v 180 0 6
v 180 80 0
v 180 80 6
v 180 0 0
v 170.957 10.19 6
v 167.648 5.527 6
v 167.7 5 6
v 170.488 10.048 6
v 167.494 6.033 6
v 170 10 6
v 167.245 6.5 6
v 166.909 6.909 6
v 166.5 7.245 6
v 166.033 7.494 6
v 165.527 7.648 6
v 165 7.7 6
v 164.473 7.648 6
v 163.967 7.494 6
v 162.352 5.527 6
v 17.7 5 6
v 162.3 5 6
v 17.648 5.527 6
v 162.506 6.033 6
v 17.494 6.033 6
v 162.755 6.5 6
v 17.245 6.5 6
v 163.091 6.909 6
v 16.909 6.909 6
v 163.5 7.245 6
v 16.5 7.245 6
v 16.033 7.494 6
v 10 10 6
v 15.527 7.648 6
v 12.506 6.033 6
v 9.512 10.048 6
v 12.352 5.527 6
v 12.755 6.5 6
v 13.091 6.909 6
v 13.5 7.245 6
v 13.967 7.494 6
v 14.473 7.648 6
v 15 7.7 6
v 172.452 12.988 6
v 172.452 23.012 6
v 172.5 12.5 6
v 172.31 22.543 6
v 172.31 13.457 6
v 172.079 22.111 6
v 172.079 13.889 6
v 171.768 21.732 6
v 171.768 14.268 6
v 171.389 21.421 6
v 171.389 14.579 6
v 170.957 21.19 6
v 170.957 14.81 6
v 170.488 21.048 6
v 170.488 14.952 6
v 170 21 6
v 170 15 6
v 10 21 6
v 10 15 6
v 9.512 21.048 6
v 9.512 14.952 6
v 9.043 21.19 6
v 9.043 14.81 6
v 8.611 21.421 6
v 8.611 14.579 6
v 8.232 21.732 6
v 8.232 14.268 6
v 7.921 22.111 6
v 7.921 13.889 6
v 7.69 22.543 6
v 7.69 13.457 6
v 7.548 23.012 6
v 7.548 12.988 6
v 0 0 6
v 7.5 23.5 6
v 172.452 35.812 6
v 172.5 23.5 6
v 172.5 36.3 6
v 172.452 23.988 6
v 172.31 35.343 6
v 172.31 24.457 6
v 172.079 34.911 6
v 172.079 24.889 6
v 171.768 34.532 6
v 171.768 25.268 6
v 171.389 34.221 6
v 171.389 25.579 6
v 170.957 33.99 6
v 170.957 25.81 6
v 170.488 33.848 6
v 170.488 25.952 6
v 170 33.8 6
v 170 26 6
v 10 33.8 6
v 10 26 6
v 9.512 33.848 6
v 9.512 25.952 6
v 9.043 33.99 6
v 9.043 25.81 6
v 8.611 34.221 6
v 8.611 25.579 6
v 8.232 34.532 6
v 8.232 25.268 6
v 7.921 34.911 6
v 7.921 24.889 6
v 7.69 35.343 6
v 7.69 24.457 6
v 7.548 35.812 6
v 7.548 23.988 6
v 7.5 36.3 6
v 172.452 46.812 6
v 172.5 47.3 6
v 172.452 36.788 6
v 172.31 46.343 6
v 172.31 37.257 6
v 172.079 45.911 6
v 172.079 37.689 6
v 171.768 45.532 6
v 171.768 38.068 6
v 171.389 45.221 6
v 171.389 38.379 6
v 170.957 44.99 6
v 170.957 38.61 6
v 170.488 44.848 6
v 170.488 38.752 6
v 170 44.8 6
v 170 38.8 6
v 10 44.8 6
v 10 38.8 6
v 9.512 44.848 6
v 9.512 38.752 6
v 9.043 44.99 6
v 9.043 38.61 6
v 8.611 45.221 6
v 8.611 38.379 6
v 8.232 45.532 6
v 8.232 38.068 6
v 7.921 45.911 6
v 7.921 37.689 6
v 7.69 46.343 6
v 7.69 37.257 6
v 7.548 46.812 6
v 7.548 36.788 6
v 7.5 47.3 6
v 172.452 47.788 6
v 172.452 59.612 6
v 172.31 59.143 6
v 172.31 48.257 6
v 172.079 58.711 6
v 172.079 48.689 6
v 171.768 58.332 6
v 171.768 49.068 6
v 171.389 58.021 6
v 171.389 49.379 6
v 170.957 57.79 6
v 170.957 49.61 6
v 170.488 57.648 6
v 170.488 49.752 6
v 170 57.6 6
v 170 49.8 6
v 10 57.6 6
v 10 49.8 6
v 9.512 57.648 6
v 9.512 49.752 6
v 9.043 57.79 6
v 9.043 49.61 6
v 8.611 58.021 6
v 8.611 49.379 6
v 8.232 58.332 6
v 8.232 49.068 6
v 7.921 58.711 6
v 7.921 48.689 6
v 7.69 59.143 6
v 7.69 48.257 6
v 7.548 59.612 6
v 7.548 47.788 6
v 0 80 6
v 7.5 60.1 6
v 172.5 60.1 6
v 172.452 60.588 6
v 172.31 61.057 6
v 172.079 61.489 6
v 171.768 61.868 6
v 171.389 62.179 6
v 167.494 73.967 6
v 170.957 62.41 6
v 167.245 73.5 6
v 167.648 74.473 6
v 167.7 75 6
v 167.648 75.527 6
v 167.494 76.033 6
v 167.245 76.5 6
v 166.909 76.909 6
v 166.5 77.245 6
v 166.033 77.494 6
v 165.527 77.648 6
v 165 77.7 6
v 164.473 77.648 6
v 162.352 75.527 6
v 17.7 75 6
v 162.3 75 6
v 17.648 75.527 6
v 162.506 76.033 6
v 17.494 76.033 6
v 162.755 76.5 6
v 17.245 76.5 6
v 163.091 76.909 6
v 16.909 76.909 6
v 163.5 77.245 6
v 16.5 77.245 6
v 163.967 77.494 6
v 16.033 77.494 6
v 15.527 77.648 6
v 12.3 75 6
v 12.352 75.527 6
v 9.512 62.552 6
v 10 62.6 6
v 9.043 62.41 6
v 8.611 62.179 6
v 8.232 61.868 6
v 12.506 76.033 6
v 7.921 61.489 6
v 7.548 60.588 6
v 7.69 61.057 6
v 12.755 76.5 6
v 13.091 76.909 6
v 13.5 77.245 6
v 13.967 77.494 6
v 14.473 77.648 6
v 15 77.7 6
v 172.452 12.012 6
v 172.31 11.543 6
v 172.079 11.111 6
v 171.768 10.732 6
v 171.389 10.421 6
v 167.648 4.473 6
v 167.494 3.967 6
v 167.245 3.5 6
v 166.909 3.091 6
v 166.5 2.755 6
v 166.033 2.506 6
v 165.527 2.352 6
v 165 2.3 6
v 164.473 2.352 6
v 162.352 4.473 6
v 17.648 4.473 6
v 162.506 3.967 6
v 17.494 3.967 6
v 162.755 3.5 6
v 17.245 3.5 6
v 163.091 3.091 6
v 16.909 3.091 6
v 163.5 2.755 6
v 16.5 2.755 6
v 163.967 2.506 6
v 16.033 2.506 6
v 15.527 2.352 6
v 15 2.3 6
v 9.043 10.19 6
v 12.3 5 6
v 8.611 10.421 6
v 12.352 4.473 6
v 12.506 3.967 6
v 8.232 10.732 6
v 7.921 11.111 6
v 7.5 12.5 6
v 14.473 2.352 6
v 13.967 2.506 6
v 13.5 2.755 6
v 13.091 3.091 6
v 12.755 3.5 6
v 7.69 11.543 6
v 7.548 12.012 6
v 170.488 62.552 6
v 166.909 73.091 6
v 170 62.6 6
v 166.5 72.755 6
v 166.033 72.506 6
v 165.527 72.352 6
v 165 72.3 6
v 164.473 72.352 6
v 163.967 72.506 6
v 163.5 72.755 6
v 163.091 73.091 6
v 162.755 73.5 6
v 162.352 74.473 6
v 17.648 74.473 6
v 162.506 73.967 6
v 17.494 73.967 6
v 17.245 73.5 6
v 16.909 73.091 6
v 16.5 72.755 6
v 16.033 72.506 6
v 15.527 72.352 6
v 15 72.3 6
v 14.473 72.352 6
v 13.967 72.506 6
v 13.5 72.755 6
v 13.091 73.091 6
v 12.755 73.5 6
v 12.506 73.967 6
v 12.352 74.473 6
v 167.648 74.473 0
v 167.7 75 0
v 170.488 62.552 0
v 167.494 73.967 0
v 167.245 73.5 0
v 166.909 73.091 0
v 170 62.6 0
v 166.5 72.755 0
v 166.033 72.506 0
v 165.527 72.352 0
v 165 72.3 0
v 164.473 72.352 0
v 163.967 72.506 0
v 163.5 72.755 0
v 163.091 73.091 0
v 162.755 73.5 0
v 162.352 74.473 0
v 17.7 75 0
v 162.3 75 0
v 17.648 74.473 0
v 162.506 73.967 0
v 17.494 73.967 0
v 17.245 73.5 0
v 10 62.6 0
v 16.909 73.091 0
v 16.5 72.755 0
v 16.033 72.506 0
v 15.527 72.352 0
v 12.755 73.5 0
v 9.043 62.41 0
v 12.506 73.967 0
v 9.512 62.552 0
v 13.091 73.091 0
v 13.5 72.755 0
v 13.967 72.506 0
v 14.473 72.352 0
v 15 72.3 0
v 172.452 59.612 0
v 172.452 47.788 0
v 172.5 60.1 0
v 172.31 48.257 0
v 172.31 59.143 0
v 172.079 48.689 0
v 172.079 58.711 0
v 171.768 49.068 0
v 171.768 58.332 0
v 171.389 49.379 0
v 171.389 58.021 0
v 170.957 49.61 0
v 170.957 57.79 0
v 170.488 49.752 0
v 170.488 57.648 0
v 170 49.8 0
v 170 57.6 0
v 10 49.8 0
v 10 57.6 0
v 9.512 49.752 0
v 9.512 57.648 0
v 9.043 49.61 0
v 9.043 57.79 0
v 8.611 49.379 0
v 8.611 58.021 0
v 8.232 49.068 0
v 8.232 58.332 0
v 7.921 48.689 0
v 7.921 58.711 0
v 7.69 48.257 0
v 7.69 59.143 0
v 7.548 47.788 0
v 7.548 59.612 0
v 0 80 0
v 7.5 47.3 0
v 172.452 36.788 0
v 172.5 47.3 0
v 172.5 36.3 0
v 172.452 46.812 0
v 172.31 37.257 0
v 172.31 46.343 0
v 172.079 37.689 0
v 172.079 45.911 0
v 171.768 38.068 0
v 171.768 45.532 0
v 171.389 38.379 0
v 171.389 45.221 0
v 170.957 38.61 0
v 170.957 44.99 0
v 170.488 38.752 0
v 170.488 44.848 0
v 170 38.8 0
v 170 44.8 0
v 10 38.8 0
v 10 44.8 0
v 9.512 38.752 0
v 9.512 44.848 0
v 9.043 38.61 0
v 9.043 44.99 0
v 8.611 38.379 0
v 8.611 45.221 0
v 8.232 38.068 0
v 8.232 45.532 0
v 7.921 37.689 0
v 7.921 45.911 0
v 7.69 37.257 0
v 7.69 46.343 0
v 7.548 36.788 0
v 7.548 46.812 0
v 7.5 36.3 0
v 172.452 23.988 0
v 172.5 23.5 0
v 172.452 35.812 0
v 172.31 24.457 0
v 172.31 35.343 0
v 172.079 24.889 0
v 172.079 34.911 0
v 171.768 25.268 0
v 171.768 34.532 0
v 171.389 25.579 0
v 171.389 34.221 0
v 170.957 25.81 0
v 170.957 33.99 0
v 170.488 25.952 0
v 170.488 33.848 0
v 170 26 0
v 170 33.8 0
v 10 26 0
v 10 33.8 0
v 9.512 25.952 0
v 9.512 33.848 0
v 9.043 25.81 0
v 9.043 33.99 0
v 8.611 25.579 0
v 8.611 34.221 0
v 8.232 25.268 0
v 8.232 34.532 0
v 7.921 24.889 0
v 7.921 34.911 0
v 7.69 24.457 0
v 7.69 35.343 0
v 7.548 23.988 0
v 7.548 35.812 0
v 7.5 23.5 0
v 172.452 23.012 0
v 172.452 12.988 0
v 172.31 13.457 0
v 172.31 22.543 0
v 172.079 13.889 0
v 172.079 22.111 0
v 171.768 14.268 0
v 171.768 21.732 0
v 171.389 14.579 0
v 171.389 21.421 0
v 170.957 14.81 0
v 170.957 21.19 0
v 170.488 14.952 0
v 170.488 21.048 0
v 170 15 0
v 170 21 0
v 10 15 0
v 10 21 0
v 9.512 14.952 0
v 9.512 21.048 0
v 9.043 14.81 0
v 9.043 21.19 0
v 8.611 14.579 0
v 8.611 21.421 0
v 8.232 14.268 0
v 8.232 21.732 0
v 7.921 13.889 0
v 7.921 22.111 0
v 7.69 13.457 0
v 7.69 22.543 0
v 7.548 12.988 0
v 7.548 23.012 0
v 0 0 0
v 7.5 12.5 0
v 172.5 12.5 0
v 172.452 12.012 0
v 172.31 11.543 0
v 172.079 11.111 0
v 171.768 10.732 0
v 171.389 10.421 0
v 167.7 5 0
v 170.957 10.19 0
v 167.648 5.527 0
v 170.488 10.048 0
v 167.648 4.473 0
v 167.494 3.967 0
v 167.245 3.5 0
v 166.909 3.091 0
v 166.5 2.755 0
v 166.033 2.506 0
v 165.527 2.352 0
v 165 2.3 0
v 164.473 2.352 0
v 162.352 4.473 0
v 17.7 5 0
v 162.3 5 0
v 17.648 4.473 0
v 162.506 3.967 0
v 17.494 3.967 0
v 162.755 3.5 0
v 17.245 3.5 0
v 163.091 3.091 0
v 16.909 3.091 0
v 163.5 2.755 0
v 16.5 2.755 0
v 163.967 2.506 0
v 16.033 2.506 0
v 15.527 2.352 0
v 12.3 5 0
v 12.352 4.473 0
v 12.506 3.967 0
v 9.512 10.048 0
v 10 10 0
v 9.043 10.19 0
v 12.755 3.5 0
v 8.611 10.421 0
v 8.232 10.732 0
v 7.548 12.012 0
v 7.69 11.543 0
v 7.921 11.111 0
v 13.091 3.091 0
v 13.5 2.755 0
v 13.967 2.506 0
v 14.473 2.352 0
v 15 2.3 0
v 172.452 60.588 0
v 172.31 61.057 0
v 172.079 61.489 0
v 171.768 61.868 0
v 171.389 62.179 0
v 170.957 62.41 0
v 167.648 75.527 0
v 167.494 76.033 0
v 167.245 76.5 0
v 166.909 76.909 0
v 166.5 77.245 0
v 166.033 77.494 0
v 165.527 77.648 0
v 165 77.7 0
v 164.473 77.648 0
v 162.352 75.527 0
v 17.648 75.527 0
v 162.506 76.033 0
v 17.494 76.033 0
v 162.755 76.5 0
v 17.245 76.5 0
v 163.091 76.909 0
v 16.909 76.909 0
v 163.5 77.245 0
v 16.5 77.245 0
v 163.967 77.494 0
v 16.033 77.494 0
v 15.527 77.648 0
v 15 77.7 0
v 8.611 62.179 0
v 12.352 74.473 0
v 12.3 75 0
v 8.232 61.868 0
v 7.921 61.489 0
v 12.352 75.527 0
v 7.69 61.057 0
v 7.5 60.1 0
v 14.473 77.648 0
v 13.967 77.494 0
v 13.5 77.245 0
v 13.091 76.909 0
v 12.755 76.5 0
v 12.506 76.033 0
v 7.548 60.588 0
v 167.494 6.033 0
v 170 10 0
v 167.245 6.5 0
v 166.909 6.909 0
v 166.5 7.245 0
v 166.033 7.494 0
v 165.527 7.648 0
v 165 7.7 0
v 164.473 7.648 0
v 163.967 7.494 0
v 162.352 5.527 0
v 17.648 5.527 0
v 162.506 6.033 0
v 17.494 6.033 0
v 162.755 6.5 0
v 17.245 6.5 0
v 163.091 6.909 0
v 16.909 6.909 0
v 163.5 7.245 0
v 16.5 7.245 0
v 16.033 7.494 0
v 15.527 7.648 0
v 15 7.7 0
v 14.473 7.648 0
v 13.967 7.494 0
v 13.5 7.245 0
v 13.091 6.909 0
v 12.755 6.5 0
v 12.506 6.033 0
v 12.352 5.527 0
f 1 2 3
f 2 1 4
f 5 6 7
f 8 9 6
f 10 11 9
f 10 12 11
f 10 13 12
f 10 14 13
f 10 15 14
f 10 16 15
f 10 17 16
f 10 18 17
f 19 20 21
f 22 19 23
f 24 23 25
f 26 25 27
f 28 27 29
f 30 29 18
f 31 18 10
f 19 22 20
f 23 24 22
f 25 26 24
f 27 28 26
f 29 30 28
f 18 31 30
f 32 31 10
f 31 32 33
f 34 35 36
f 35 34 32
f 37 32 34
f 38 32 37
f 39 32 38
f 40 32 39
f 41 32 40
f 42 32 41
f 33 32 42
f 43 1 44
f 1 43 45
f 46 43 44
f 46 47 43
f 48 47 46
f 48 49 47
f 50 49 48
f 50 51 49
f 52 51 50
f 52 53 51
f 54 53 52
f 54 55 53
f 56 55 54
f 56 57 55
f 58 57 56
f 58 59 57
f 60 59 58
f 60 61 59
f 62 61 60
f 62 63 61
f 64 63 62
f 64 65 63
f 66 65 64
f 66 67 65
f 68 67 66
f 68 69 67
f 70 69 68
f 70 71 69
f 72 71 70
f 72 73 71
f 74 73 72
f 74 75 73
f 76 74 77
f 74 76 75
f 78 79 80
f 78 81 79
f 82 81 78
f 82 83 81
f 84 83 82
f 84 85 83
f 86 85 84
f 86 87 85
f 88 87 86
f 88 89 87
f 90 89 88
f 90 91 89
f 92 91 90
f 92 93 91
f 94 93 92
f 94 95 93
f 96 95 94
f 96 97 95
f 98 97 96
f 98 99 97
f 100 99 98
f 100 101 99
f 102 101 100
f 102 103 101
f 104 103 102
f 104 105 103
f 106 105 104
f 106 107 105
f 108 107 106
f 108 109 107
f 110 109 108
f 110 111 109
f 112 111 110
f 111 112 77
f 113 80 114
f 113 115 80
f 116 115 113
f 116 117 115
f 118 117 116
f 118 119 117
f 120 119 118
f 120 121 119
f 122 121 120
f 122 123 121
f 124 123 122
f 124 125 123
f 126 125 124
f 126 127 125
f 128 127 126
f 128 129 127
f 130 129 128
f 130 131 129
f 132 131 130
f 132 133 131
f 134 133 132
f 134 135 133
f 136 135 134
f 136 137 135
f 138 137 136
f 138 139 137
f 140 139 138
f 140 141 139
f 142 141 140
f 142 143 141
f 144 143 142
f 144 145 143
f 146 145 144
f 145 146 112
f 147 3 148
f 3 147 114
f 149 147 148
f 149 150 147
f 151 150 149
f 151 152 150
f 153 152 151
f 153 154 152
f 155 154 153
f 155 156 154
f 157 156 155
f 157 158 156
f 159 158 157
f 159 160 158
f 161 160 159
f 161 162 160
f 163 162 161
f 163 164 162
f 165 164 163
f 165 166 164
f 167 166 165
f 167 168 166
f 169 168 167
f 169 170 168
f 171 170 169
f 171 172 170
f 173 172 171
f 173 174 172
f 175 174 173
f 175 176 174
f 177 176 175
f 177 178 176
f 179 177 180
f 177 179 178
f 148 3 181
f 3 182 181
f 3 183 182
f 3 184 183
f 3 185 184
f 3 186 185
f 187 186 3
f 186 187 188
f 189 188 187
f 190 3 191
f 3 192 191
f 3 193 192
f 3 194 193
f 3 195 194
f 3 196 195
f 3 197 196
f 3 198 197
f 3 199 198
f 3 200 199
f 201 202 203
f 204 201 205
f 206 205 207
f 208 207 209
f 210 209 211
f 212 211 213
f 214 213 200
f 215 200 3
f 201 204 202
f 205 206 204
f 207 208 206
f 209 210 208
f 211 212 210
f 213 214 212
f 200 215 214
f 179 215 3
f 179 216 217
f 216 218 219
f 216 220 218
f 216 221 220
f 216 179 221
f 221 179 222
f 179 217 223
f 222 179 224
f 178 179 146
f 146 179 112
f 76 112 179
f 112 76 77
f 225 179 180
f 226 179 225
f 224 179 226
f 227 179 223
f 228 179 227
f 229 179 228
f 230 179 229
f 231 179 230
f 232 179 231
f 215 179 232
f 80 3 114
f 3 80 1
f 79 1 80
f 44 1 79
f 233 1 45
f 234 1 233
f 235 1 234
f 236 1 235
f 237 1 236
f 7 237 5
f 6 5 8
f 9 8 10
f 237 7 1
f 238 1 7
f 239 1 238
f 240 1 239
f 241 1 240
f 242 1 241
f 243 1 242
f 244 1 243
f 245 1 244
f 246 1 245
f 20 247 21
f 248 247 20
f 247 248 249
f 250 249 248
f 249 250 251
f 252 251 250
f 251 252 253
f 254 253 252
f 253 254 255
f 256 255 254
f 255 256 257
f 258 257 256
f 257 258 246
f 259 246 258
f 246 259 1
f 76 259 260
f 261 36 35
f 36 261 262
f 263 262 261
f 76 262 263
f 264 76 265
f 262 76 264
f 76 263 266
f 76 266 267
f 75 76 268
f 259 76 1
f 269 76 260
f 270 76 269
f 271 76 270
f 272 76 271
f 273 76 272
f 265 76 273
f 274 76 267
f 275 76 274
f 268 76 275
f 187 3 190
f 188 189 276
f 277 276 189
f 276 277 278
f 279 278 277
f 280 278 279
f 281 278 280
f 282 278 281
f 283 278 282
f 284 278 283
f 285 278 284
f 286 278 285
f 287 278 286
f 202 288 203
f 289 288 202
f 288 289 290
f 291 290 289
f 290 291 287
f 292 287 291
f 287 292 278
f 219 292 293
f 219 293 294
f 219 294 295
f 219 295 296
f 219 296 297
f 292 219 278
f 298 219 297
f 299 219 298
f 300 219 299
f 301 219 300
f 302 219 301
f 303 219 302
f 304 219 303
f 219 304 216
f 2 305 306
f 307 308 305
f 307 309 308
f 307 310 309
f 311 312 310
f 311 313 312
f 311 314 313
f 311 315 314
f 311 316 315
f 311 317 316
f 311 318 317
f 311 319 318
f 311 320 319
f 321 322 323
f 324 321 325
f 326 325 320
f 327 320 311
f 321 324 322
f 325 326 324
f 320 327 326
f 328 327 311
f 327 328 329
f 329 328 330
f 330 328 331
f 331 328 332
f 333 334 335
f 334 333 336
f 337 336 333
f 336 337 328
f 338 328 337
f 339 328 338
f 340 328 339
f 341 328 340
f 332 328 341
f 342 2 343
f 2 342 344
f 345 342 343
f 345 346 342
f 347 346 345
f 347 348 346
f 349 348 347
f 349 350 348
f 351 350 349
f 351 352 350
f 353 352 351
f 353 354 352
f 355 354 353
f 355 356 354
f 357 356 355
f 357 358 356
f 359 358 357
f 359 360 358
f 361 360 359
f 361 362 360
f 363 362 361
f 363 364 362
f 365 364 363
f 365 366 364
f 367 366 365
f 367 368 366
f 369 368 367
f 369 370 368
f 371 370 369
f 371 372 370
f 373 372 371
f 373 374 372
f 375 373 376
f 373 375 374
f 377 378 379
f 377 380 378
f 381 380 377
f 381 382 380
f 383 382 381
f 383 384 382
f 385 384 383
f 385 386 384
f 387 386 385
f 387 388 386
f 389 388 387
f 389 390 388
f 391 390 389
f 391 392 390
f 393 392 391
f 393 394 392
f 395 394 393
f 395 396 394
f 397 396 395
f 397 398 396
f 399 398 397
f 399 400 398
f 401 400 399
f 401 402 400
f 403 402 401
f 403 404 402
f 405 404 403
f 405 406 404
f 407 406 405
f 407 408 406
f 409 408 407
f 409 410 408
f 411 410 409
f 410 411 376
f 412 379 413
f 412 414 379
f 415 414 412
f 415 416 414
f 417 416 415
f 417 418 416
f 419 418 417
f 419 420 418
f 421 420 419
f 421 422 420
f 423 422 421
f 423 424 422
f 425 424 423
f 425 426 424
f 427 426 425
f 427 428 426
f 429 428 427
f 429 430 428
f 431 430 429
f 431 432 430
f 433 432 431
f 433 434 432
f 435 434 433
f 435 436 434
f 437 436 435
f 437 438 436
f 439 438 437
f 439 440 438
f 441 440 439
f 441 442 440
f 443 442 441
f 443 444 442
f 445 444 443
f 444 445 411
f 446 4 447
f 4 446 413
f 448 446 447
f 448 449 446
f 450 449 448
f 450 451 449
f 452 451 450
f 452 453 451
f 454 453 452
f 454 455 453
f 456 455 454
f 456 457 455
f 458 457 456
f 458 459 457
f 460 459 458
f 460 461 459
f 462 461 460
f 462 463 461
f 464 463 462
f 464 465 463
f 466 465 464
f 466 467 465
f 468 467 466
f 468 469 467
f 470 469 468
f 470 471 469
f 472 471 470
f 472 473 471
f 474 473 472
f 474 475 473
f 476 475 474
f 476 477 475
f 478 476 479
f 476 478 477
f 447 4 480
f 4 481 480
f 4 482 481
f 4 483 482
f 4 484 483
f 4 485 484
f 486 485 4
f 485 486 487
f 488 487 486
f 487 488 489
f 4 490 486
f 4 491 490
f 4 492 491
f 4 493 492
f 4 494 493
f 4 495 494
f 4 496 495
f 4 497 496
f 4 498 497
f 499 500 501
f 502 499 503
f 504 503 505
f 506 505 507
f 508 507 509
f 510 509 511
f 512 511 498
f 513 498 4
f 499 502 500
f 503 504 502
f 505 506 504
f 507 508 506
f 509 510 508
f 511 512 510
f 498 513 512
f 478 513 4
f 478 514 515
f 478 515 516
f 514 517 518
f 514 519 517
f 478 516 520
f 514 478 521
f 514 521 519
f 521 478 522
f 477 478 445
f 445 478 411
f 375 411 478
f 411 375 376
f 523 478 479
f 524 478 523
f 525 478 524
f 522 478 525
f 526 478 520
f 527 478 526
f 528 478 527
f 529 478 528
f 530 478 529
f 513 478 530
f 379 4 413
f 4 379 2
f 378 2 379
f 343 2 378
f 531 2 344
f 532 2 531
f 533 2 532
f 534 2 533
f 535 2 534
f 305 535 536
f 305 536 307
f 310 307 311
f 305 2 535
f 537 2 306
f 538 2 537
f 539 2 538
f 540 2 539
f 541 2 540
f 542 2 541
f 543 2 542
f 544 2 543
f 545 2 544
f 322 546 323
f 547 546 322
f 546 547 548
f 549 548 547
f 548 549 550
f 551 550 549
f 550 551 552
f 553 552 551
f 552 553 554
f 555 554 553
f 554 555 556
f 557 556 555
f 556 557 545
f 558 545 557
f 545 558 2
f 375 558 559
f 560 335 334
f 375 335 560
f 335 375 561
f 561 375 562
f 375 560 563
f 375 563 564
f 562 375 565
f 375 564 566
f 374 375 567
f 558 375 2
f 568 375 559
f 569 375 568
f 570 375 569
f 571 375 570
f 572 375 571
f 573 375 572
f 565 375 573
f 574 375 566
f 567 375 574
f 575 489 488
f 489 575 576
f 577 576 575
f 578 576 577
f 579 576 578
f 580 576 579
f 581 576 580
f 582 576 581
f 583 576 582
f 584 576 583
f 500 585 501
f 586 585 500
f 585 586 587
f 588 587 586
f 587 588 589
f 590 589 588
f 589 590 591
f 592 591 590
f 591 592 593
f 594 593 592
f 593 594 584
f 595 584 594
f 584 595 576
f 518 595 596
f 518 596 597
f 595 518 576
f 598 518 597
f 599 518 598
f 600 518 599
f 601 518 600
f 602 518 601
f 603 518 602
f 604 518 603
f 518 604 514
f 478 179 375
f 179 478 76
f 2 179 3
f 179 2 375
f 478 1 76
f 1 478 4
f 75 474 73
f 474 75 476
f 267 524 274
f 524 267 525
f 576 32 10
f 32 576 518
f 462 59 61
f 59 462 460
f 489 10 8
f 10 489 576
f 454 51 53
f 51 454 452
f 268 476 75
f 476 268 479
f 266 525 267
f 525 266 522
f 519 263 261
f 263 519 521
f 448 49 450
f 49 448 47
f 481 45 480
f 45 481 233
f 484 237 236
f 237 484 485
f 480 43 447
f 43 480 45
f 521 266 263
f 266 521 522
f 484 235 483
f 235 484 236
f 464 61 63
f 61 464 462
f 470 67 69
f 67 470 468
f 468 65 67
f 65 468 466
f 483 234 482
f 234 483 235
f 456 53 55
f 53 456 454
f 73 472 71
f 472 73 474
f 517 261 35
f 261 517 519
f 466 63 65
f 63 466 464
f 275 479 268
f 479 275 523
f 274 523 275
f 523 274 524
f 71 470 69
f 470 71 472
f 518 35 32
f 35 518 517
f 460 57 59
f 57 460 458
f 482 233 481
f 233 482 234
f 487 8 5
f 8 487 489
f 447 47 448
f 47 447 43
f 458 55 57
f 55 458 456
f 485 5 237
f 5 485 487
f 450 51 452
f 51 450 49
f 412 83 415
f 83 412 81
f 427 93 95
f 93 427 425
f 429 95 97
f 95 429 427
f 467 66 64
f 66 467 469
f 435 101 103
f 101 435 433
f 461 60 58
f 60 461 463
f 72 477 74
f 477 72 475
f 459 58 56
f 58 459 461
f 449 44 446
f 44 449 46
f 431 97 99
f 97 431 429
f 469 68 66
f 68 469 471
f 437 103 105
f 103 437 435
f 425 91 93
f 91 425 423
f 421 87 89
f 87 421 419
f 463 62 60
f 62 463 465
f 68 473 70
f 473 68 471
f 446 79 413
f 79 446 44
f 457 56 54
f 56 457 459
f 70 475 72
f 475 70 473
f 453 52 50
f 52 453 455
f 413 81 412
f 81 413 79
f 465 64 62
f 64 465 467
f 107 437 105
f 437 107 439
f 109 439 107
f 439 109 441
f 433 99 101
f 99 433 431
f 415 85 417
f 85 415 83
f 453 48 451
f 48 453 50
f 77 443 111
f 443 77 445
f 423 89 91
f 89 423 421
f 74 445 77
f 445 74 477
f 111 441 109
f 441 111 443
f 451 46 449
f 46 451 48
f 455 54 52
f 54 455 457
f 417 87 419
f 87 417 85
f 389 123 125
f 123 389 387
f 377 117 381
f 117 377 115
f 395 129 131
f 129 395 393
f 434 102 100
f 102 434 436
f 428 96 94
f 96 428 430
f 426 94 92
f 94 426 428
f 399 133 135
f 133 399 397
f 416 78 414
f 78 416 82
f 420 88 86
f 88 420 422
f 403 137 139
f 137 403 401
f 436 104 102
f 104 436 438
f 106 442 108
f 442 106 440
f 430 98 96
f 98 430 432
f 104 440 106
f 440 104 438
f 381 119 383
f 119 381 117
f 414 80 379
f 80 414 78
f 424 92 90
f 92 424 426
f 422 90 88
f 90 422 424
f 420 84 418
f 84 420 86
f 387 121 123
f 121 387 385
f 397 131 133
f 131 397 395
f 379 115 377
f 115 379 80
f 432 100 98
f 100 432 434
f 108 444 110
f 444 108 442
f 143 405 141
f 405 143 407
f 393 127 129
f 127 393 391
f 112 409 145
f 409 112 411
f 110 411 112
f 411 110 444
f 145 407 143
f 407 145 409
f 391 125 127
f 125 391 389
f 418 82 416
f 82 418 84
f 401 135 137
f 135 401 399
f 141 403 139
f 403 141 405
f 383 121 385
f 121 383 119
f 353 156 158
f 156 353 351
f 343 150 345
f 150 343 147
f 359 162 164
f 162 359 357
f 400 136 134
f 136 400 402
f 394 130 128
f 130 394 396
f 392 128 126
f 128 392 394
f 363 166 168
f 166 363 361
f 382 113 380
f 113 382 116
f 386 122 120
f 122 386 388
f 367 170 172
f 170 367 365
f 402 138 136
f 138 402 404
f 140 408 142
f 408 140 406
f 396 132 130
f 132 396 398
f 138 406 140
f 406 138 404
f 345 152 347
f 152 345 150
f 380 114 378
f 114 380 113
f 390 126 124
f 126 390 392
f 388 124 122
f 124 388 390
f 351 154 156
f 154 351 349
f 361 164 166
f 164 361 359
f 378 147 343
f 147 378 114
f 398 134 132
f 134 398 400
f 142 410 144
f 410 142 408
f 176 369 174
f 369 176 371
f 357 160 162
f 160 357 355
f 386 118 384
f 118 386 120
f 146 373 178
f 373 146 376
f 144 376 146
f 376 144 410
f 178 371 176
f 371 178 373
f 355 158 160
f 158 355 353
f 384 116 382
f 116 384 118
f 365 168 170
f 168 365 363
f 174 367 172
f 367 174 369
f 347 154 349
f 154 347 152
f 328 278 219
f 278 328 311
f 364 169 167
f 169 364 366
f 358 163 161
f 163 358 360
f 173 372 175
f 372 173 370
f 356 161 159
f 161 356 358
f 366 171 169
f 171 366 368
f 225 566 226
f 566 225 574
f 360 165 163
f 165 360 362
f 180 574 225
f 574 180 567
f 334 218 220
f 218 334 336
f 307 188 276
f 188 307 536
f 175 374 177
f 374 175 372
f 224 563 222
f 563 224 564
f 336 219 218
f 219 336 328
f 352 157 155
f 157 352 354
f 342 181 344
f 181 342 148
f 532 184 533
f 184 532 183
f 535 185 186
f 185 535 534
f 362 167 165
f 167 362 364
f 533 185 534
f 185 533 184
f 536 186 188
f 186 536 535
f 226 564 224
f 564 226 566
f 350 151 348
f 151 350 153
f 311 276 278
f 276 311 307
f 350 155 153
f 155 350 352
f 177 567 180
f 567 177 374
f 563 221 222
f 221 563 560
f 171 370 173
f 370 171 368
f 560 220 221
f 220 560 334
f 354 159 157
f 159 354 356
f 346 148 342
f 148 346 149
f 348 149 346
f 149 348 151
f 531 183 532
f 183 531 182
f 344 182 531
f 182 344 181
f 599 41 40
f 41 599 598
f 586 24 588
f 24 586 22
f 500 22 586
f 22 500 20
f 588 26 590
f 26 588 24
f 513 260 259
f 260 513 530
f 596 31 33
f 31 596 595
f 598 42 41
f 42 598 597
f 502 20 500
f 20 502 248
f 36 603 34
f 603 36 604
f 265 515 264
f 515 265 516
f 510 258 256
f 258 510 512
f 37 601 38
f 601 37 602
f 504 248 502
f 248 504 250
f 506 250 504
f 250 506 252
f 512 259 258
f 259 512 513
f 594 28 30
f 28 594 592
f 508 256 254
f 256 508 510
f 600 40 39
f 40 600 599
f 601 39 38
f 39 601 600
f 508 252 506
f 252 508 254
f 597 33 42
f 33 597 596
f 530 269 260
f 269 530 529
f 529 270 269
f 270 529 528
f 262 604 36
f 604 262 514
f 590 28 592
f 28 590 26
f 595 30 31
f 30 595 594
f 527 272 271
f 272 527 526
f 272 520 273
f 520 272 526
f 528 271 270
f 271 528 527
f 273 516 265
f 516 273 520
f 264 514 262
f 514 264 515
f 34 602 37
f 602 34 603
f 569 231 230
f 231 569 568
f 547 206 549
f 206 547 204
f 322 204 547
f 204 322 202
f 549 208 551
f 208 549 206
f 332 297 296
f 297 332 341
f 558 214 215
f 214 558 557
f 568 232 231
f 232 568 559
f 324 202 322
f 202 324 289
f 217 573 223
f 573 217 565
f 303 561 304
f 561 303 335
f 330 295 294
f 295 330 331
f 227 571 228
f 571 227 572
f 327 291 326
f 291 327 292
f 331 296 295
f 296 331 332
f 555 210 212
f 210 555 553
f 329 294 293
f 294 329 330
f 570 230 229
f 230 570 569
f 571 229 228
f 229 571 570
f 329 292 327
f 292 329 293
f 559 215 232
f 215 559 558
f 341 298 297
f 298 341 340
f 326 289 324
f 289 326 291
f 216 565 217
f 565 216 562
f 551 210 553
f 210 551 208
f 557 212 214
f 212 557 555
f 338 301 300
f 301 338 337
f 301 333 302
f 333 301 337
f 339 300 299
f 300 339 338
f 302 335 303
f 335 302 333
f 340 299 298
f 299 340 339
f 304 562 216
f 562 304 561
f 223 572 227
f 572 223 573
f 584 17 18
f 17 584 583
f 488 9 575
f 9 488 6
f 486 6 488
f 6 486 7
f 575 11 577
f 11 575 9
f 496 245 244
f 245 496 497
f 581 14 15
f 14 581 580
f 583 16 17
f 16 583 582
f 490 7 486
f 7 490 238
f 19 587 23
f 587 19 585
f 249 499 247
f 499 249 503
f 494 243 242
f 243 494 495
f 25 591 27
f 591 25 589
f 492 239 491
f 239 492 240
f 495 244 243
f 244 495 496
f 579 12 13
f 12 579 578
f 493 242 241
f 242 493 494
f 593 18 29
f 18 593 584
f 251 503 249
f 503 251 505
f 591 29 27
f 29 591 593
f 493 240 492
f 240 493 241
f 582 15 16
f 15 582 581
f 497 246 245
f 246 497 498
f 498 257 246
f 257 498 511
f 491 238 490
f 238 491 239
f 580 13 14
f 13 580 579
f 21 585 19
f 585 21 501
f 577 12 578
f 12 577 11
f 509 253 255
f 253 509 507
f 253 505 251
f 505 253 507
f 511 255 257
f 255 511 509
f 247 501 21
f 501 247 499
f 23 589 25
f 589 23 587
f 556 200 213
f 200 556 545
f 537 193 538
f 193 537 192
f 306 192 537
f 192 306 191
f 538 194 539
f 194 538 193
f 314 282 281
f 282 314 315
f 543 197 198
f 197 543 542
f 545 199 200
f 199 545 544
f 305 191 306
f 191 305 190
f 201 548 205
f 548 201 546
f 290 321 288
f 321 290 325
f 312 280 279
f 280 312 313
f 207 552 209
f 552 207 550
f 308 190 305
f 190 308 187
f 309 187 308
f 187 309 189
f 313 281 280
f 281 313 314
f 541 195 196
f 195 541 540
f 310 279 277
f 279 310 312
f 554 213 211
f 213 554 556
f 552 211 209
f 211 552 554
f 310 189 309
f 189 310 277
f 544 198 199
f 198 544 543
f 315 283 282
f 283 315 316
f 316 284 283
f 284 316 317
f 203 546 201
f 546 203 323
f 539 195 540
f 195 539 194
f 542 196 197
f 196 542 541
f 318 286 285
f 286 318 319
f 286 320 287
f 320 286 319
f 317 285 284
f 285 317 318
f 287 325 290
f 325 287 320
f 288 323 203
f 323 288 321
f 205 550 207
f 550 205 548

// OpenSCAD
$fn = 32;

// ----------------------------------------------------------------------
// Slotted panel: 180 x 80 mm, 5 рядов of slots
// ----------------------------------------------------------------------

// --- parameters (mm) ---
panel_w = 180;            // panel width
panel_d = 80;             // panel depth
thick = 6;                // panel thickness
slot_w = 5;               // slot width
pitch0 = 11;              // first row pitch
pitch_step = 1.8;         // pitch increase per row
margin = 10;              // margin around the slot field
rows = 5;                 // number of slot rows
mount_d = 5.4;            // mounting holes
mount_x = 75;             // mounting hole offset

difference() {
  union() {
    cube([panel_w, panel_d, thick]);
  }
  /* slot rows: stadium shaped cutters, 2.5 mm clear of both faces */
  /* row 0: pitch 11, length 160 */
  hull() {
    translate([10, 12.5, -2.5]) cylinder(h = thick + 5, d = slot_w);
    translate([170, 12.5, -2.5]) cylinder(h = thick + 5, d = slot_w);
  }
  /* row 1: pitch 12.8, length 160 */
  hull() {
    translate([10, 23.5, -2.5]) cylinder(h = thick + 5, d = slot_w);
    translate([170, 23.5, -2.5]) cylinder(h = thick + 5, d = slot_w);
  }
  /* row 2: pitch 11, length 160 */
  hull() {
    translate([10, 36.3, -2.5]) cylinder(h = thick + 5, d = slot_w);
    translate([170, 36.3, -2.5]) cylinder(h = thick + 5, d = slot_w);
  }
  /* row 3: pitch 12.8, length 160 */
  hull() {
    translate([10, 47.3, -2.5]) cylinder(h = thick + 5, d = slot_w);
    translate([170, 47.3, -2.5]) cylinder(h = thick + 5, d = slot_w);
  }
  /* row 4: pitch 11, length 160 */
  hull() {
    translate([10, 60.1, -2.5]) cylinder(h = thick + 5, d = slot_w);
    translate([170, 60.1, -2.5]) cylinder(h = thick + 5, d = slot_w);
  }
  translate([15, 5, -2.5]) cylinder(h = 11, d = mount_d);
  translate([15, 75, -2.5]) cylinder(h = 11, d = mount_d);
  translate([165, 5, -2.5]) cylinder(h = 11, d = mount_d);
  translate([165, 75, -2.5]) cylinder(h = 11, d = mount_d);
}
